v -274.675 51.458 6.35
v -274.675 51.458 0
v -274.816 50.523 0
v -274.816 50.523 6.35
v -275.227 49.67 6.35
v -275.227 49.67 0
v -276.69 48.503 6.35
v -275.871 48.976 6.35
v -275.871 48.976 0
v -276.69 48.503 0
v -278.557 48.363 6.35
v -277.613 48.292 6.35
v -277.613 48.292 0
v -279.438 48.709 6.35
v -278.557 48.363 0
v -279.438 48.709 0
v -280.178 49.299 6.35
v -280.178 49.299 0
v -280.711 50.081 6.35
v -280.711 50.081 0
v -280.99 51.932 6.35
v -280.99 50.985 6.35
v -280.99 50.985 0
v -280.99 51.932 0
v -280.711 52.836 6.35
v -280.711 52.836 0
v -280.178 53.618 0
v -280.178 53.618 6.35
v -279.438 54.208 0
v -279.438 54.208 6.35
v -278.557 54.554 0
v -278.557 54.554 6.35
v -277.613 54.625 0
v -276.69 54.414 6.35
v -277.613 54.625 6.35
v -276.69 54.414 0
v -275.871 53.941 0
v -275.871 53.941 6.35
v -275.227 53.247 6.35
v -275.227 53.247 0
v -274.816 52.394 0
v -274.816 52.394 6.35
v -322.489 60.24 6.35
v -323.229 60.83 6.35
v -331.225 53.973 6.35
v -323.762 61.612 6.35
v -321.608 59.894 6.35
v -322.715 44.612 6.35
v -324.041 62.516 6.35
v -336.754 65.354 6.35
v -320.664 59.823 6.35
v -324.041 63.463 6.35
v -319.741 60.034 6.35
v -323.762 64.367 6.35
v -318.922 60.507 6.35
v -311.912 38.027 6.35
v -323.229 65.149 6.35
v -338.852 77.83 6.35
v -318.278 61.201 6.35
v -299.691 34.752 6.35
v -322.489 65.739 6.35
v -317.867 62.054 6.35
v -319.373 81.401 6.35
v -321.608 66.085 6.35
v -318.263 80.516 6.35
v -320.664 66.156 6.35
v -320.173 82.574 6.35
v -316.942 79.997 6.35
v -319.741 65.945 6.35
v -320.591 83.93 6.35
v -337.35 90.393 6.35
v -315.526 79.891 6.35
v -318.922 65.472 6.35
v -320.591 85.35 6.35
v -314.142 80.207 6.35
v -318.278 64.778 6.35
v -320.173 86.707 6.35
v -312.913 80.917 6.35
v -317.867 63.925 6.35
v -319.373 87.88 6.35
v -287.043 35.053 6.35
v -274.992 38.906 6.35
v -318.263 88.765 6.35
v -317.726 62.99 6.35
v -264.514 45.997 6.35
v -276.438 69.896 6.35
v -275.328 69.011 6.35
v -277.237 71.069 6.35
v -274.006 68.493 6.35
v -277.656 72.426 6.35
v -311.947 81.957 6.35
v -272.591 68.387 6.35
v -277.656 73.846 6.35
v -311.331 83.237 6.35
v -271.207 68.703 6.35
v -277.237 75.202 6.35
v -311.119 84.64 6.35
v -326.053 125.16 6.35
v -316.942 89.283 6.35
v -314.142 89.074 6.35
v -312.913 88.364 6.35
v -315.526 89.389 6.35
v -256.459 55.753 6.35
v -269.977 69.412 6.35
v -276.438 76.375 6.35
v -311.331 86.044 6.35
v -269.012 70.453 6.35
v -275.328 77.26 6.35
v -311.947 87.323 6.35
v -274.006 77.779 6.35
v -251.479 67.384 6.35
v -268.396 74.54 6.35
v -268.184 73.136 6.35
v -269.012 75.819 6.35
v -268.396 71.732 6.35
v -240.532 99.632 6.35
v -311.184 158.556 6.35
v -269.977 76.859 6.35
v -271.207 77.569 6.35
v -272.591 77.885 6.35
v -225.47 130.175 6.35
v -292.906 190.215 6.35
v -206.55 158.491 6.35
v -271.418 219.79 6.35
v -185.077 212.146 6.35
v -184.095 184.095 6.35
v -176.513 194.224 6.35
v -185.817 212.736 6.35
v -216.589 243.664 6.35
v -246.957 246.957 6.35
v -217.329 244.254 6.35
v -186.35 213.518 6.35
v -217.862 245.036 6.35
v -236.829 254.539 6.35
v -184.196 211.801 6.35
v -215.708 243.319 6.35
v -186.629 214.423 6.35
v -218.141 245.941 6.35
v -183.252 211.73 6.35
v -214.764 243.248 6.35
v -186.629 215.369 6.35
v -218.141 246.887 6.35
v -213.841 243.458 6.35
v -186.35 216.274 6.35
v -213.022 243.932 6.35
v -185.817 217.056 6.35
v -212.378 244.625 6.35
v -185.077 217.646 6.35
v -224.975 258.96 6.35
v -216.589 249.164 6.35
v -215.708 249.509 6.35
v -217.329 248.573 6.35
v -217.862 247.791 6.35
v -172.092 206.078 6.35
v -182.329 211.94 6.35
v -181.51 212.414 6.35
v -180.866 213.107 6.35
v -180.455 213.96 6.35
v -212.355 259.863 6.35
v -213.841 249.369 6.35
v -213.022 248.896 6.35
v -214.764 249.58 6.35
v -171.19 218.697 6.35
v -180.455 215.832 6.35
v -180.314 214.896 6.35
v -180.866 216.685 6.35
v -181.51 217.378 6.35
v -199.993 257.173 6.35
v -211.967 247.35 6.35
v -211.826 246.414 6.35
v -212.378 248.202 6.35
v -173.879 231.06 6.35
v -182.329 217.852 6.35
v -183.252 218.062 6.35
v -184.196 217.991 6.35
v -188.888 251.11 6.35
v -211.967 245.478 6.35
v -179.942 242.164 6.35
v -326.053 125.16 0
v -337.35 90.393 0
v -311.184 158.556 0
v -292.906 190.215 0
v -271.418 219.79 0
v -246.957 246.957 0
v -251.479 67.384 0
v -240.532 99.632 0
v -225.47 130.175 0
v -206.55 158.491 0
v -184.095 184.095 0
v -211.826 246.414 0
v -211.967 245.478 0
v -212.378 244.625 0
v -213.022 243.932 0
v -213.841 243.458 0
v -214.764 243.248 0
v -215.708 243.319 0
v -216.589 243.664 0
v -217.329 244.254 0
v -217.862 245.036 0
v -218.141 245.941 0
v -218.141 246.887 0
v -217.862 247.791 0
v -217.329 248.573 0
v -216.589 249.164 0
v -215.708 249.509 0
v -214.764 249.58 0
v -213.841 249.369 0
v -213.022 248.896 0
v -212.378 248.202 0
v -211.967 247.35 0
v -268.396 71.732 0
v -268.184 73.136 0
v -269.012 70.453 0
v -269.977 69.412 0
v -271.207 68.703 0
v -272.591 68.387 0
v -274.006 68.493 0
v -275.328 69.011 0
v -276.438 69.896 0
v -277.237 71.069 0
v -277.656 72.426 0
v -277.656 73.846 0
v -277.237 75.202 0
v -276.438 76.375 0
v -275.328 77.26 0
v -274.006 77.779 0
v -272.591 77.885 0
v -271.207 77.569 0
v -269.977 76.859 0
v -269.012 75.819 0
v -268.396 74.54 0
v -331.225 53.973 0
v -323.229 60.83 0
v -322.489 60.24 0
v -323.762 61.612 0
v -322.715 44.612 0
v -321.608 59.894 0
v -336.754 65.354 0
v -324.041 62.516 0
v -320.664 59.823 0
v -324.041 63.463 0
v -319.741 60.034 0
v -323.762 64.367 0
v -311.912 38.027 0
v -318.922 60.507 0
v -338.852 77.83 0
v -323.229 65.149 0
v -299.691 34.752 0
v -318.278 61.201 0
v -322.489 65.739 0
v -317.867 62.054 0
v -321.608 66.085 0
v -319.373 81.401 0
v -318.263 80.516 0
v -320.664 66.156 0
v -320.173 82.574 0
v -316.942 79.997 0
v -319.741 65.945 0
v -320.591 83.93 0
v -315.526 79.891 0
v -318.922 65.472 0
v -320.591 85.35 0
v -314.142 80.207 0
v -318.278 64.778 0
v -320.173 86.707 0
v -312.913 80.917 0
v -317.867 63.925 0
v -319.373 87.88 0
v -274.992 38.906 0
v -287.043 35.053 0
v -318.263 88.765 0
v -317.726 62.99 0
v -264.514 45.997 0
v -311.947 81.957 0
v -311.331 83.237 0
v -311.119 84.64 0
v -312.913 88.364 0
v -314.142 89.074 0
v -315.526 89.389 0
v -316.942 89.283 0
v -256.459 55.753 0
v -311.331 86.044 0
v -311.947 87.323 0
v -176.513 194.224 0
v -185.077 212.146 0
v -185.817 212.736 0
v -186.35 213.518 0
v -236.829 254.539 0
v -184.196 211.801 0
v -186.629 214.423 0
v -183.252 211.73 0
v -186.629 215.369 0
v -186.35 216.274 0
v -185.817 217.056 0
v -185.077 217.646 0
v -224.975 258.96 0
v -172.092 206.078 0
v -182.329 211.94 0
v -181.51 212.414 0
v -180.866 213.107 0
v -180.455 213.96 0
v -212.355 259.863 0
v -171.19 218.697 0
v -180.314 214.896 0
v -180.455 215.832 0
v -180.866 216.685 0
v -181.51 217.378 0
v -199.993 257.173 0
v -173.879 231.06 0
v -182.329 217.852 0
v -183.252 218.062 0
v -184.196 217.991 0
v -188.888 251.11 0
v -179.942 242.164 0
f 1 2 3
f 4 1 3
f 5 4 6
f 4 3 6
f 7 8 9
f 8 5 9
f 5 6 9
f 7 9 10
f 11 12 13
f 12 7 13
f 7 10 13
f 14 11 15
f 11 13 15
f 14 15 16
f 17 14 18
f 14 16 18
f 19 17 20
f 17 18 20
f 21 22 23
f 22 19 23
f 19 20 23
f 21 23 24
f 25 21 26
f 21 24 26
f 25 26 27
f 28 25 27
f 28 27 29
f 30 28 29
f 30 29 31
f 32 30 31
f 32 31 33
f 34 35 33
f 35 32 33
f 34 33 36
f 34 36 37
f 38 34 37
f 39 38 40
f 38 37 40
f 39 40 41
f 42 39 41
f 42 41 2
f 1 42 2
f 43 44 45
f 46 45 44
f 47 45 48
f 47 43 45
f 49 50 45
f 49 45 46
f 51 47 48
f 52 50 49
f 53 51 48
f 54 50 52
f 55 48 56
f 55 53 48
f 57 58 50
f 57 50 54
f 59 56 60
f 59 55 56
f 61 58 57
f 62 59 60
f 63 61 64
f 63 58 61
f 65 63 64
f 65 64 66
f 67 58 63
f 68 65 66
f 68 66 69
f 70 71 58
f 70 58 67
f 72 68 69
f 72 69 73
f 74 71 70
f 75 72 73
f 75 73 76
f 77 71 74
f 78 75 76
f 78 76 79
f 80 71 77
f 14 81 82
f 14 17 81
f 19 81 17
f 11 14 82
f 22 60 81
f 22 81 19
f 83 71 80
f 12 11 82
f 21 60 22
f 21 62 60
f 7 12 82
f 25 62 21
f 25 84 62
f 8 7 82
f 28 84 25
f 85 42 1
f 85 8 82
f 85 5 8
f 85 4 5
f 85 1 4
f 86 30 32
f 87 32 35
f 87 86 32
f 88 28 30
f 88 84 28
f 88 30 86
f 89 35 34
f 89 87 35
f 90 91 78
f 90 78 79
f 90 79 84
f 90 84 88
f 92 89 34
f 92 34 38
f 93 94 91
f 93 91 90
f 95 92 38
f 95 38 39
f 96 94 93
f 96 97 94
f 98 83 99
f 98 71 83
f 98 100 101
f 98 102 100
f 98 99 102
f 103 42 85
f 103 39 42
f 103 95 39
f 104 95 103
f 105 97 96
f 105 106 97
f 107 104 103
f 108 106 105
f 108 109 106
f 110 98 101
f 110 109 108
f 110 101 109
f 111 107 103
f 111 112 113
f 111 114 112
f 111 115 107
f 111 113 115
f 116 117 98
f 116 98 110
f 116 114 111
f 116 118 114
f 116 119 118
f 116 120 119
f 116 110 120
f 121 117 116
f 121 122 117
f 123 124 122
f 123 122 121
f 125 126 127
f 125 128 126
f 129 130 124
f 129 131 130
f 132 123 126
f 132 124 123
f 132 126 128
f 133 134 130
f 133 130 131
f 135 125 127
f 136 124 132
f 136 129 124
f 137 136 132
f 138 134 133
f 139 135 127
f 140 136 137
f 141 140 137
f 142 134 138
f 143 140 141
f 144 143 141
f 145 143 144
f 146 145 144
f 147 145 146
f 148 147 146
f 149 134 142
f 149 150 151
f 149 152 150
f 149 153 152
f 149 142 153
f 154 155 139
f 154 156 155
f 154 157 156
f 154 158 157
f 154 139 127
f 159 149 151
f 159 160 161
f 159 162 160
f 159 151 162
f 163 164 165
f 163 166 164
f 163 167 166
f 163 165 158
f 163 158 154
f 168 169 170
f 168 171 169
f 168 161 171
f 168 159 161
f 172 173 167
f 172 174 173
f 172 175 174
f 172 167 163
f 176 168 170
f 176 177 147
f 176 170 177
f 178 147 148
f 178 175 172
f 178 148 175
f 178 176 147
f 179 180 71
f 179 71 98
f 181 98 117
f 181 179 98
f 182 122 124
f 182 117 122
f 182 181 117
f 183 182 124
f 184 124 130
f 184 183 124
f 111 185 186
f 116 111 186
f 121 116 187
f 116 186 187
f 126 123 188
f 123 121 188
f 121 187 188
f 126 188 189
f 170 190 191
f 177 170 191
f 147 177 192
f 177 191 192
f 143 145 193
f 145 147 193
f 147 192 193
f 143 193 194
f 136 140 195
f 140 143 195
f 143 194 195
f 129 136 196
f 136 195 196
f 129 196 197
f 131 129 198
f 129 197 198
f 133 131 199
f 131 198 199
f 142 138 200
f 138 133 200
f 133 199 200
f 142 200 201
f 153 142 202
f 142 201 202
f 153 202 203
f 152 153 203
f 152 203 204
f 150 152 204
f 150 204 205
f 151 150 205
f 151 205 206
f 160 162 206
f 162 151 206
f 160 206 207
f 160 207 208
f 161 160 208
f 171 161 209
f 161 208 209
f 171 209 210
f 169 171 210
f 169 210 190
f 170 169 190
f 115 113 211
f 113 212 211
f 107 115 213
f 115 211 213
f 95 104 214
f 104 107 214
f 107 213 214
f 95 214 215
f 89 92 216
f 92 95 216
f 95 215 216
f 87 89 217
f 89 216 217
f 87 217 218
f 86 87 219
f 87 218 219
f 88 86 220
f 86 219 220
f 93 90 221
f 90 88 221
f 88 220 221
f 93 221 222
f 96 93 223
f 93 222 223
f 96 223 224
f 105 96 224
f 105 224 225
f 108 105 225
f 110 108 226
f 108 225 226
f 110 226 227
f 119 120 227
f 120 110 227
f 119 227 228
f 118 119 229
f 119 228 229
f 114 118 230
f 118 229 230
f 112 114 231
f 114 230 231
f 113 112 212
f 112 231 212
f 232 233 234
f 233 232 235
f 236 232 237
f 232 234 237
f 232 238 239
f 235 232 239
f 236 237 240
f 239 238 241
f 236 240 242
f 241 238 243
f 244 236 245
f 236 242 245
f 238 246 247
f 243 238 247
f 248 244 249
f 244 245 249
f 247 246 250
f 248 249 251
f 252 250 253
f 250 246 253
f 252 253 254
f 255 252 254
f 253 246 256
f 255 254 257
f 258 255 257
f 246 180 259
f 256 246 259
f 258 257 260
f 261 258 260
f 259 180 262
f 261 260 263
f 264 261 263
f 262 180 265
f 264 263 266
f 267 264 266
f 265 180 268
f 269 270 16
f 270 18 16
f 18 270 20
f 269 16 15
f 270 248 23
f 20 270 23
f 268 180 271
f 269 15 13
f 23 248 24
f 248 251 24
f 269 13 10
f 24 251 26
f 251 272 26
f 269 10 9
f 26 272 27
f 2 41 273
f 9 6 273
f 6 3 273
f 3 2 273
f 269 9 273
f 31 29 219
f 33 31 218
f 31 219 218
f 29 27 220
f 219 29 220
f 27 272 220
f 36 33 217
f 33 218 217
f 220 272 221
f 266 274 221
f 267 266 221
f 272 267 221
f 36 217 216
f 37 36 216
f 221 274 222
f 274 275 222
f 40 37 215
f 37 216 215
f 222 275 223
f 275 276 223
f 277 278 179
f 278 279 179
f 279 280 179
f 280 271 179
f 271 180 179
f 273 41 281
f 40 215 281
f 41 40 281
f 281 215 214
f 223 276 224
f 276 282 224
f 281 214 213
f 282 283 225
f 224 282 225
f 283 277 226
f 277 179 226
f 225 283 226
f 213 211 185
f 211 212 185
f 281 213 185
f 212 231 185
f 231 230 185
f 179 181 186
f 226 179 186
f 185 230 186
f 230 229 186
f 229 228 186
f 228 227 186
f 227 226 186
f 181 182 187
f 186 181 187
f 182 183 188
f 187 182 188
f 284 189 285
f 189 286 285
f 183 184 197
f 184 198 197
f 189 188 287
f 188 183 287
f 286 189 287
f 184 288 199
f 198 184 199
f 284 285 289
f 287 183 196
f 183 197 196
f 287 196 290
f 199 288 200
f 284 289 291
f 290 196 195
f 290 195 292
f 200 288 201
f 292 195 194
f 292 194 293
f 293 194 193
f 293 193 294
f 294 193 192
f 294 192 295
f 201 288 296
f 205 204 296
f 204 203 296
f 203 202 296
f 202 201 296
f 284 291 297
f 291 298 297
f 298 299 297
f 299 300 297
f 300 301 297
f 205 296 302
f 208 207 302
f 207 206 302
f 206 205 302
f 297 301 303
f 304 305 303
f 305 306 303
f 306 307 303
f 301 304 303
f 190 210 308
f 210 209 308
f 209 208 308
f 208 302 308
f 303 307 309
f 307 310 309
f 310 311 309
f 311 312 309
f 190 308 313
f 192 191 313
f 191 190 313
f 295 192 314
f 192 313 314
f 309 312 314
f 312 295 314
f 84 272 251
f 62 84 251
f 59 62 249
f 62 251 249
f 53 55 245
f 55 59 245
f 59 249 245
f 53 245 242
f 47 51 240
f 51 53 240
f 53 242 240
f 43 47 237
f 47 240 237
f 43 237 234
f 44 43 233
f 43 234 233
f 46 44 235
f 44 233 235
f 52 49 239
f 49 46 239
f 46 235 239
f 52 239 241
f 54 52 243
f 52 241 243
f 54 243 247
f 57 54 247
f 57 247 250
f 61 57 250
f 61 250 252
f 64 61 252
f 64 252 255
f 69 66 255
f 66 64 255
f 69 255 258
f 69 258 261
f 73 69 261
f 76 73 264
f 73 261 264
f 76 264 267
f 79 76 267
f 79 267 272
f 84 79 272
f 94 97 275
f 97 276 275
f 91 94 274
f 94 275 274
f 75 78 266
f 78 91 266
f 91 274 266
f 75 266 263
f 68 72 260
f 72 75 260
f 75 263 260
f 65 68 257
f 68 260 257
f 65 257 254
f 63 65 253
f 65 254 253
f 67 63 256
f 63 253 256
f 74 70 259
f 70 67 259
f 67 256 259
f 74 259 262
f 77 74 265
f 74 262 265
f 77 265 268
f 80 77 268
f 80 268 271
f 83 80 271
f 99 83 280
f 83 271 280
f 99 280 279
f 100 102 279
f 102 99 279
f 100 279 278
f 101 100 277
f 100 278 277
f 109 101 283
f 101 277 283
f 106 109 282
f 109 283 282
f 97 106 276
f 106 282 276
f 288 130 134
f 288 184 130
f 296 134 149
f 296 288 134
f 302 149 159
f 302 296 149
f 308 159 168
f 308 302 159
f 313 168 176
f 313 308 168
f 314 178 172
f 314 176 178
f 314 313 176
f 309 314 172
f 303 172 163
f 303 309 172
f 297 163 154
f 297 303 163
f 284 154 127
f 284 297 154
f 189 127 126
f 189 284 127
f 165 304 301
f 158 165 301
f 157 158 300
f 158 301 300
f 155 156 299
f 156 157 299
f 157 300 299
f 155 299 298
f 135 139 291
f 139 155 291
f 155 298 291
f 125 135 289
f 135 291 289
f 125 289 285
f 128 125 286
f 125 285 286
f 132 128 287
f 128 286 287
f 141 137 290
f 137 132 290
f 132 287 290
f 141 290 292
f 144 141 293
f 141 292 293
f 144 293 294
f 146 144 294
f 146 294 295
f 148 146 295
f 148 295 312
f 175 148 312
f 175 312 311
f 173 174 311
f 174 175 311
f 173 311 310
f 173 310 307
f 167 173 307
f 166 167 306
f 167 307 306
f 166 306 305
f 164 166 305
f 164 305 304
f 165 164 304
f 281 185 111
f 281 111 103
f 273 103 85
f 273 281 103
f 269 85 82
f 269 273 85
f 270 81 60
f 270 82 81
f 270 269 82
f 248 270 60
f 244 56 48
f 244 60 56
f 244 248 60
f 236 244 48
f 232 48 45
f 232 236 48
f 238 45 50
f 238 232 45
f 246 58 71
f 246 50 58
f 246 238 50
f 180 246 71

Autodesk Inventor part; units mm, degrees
ref_plane "YZ Plane" through (0, 0, 0) normal (1, 0, 0) x (0, 1, 0)
ref_plane "XZ Plane" through (0, 0, 0) normal (0, 1, 0) x (-1, 0, 0)
ref_plane "XY Plane" through (0, 0, 0) normal (0, 0, 1) x (1, 0, 0)
sketch "Sketch1" plane through (0, 0, 0) normal (0, 0, 1) x (1, 0, 0)
  arc A0 (-215.5261, 215.5261) -> (-294.4142, 78.888) centre (0, 0) ccw construction
  arc A1 (-246.957, 246.957) -> (-337.3496, 90.3926) centre (0, 0) ccw
  arc A2 (-184.0953, 184.0953) -> (-251.4788, 67.3835) centre (0, 0) ccw
  arc A3 (-184.0953, 184.0953) -> (-246.957, 246.957) centre (-215.5261, 215.5261) ccw
  arc A4 (-337.3496, 90.3926) -> (-251.4788, 67.3835) centre (-294.4142, 78.888) ccw
  line L0 (0, 0) -> (-294.4142, 78.888) construction
  line L1 (0, 0) -> (294.4142, -78.888) construction
  line L2 (0, 0) -> (-215.5261, 215.5261) construction
  line L3 (0, 0) -> (-111.7396, 0) construction
  line L4 (-246.957, 246.957) -> (-184.0953, 184.0953) construction
  line L5 (-294.4142, 78.888) -> (-251.4788, 67.3835) construction
  line L6 (-337.3496, 90.3926) -> (-294.4142, 78.888) construction
  line L7 (-246.957, 246.957) -> (-215.5261, 215.5261) construction
  line L8 (-184.0953, 184.0953) -> (-215.5261, 215.5261) construction
  arc A5 (-199.8107, 199.8107) -> (-272.9465, 73.1358) centre (0, 0) ccw construction
  arc A6 (-204.3008, 204.3008) -> (-279.0801, 74.7793) centre (0, 0) ccw construction
  arc A7 (-195.3206, 195.3206) -> (-266.8129, 71.4923) centre (0, 0) ccw construction
  arc A8 (-195.3206, 195.3206) -> (-204.3008, 204.3008) centre (-199.8107, 199.8107) ccw construction
  arc A9 (-279.0801, 74.7793) -> (-266.8129, 71.4923) centre (-272.9465, 73.1358) ccw construction
  arc A10 (-231.2416, 231.2416) -> (-315.8819, 84.6403) centre (0, 0) ccw construction
  arc A11 (-235.7317, 235.7317) -> (-322.0155, 86.2838) centre (0, 0) ccw construction
  arc A12 (-226.7515, 226.7515) -> (-309.7483, 82.9968) centre (0, 0) ccw construction
  arc A13 (-226.7515, 226.7515) -> (-235.7317, 235.7317) centre (-231.2416, 231.2416) ccw construction
  arc A14 (-322.0155, 86.2838) -> (-309.7483, 82.9968) centre (-315.8819, 84.6403) ccw construction
  circle A15 centre (-320.9013, 62.9895) radius 3.175
  circle A16 centre (-277.8501, 51.4585) radius 3.175
  circle A17 centre (0, 0) radius 282.575 construction
  circle A18 centre (0, 0) radius 327.025 construction
  circle A19 centre (-183.4894, 214.896) radius 3.175
  circle A20 centre (-215.0012, 246.4139) radius 3.175
  circle A21 centre (-315.8819, 84.6403) radius 4.7625
  circle A22 centre (-272.9465, 73.1358) radius 4.7625
  dimension "d30" = 304.8
  dimension "d31" = 180
  dimension "d32" = 30
  dimension "d33" = 88.9
  dimension "d34" = 45
  dimension "d43" = 12.7
  dimension "d44" = 12.7
  dimension "d45" = 6.35
  dimension "d46" = 6.35
  dimension "d47" = 22.225
  dimension "d48" = 22.225
  dimension "d51" = 6.35
  dimension "d52" = 6.35
  dimension "d53" = 22.225
  dimension "d54" = 22.225
  dimension "d57" = 9.525
  dimension "d58" = 9.525
extrude "Extrusion1" add sketch "Sketch1" along normal blind 6.35
sketch "Sketch2" plane through (0, 0, 6.35) normal (0, 0, 1) x (1, 0, 0)
  circle A0 centre (0, 0) radius 348.5762
properties part number "TurretHoodPanel2"
